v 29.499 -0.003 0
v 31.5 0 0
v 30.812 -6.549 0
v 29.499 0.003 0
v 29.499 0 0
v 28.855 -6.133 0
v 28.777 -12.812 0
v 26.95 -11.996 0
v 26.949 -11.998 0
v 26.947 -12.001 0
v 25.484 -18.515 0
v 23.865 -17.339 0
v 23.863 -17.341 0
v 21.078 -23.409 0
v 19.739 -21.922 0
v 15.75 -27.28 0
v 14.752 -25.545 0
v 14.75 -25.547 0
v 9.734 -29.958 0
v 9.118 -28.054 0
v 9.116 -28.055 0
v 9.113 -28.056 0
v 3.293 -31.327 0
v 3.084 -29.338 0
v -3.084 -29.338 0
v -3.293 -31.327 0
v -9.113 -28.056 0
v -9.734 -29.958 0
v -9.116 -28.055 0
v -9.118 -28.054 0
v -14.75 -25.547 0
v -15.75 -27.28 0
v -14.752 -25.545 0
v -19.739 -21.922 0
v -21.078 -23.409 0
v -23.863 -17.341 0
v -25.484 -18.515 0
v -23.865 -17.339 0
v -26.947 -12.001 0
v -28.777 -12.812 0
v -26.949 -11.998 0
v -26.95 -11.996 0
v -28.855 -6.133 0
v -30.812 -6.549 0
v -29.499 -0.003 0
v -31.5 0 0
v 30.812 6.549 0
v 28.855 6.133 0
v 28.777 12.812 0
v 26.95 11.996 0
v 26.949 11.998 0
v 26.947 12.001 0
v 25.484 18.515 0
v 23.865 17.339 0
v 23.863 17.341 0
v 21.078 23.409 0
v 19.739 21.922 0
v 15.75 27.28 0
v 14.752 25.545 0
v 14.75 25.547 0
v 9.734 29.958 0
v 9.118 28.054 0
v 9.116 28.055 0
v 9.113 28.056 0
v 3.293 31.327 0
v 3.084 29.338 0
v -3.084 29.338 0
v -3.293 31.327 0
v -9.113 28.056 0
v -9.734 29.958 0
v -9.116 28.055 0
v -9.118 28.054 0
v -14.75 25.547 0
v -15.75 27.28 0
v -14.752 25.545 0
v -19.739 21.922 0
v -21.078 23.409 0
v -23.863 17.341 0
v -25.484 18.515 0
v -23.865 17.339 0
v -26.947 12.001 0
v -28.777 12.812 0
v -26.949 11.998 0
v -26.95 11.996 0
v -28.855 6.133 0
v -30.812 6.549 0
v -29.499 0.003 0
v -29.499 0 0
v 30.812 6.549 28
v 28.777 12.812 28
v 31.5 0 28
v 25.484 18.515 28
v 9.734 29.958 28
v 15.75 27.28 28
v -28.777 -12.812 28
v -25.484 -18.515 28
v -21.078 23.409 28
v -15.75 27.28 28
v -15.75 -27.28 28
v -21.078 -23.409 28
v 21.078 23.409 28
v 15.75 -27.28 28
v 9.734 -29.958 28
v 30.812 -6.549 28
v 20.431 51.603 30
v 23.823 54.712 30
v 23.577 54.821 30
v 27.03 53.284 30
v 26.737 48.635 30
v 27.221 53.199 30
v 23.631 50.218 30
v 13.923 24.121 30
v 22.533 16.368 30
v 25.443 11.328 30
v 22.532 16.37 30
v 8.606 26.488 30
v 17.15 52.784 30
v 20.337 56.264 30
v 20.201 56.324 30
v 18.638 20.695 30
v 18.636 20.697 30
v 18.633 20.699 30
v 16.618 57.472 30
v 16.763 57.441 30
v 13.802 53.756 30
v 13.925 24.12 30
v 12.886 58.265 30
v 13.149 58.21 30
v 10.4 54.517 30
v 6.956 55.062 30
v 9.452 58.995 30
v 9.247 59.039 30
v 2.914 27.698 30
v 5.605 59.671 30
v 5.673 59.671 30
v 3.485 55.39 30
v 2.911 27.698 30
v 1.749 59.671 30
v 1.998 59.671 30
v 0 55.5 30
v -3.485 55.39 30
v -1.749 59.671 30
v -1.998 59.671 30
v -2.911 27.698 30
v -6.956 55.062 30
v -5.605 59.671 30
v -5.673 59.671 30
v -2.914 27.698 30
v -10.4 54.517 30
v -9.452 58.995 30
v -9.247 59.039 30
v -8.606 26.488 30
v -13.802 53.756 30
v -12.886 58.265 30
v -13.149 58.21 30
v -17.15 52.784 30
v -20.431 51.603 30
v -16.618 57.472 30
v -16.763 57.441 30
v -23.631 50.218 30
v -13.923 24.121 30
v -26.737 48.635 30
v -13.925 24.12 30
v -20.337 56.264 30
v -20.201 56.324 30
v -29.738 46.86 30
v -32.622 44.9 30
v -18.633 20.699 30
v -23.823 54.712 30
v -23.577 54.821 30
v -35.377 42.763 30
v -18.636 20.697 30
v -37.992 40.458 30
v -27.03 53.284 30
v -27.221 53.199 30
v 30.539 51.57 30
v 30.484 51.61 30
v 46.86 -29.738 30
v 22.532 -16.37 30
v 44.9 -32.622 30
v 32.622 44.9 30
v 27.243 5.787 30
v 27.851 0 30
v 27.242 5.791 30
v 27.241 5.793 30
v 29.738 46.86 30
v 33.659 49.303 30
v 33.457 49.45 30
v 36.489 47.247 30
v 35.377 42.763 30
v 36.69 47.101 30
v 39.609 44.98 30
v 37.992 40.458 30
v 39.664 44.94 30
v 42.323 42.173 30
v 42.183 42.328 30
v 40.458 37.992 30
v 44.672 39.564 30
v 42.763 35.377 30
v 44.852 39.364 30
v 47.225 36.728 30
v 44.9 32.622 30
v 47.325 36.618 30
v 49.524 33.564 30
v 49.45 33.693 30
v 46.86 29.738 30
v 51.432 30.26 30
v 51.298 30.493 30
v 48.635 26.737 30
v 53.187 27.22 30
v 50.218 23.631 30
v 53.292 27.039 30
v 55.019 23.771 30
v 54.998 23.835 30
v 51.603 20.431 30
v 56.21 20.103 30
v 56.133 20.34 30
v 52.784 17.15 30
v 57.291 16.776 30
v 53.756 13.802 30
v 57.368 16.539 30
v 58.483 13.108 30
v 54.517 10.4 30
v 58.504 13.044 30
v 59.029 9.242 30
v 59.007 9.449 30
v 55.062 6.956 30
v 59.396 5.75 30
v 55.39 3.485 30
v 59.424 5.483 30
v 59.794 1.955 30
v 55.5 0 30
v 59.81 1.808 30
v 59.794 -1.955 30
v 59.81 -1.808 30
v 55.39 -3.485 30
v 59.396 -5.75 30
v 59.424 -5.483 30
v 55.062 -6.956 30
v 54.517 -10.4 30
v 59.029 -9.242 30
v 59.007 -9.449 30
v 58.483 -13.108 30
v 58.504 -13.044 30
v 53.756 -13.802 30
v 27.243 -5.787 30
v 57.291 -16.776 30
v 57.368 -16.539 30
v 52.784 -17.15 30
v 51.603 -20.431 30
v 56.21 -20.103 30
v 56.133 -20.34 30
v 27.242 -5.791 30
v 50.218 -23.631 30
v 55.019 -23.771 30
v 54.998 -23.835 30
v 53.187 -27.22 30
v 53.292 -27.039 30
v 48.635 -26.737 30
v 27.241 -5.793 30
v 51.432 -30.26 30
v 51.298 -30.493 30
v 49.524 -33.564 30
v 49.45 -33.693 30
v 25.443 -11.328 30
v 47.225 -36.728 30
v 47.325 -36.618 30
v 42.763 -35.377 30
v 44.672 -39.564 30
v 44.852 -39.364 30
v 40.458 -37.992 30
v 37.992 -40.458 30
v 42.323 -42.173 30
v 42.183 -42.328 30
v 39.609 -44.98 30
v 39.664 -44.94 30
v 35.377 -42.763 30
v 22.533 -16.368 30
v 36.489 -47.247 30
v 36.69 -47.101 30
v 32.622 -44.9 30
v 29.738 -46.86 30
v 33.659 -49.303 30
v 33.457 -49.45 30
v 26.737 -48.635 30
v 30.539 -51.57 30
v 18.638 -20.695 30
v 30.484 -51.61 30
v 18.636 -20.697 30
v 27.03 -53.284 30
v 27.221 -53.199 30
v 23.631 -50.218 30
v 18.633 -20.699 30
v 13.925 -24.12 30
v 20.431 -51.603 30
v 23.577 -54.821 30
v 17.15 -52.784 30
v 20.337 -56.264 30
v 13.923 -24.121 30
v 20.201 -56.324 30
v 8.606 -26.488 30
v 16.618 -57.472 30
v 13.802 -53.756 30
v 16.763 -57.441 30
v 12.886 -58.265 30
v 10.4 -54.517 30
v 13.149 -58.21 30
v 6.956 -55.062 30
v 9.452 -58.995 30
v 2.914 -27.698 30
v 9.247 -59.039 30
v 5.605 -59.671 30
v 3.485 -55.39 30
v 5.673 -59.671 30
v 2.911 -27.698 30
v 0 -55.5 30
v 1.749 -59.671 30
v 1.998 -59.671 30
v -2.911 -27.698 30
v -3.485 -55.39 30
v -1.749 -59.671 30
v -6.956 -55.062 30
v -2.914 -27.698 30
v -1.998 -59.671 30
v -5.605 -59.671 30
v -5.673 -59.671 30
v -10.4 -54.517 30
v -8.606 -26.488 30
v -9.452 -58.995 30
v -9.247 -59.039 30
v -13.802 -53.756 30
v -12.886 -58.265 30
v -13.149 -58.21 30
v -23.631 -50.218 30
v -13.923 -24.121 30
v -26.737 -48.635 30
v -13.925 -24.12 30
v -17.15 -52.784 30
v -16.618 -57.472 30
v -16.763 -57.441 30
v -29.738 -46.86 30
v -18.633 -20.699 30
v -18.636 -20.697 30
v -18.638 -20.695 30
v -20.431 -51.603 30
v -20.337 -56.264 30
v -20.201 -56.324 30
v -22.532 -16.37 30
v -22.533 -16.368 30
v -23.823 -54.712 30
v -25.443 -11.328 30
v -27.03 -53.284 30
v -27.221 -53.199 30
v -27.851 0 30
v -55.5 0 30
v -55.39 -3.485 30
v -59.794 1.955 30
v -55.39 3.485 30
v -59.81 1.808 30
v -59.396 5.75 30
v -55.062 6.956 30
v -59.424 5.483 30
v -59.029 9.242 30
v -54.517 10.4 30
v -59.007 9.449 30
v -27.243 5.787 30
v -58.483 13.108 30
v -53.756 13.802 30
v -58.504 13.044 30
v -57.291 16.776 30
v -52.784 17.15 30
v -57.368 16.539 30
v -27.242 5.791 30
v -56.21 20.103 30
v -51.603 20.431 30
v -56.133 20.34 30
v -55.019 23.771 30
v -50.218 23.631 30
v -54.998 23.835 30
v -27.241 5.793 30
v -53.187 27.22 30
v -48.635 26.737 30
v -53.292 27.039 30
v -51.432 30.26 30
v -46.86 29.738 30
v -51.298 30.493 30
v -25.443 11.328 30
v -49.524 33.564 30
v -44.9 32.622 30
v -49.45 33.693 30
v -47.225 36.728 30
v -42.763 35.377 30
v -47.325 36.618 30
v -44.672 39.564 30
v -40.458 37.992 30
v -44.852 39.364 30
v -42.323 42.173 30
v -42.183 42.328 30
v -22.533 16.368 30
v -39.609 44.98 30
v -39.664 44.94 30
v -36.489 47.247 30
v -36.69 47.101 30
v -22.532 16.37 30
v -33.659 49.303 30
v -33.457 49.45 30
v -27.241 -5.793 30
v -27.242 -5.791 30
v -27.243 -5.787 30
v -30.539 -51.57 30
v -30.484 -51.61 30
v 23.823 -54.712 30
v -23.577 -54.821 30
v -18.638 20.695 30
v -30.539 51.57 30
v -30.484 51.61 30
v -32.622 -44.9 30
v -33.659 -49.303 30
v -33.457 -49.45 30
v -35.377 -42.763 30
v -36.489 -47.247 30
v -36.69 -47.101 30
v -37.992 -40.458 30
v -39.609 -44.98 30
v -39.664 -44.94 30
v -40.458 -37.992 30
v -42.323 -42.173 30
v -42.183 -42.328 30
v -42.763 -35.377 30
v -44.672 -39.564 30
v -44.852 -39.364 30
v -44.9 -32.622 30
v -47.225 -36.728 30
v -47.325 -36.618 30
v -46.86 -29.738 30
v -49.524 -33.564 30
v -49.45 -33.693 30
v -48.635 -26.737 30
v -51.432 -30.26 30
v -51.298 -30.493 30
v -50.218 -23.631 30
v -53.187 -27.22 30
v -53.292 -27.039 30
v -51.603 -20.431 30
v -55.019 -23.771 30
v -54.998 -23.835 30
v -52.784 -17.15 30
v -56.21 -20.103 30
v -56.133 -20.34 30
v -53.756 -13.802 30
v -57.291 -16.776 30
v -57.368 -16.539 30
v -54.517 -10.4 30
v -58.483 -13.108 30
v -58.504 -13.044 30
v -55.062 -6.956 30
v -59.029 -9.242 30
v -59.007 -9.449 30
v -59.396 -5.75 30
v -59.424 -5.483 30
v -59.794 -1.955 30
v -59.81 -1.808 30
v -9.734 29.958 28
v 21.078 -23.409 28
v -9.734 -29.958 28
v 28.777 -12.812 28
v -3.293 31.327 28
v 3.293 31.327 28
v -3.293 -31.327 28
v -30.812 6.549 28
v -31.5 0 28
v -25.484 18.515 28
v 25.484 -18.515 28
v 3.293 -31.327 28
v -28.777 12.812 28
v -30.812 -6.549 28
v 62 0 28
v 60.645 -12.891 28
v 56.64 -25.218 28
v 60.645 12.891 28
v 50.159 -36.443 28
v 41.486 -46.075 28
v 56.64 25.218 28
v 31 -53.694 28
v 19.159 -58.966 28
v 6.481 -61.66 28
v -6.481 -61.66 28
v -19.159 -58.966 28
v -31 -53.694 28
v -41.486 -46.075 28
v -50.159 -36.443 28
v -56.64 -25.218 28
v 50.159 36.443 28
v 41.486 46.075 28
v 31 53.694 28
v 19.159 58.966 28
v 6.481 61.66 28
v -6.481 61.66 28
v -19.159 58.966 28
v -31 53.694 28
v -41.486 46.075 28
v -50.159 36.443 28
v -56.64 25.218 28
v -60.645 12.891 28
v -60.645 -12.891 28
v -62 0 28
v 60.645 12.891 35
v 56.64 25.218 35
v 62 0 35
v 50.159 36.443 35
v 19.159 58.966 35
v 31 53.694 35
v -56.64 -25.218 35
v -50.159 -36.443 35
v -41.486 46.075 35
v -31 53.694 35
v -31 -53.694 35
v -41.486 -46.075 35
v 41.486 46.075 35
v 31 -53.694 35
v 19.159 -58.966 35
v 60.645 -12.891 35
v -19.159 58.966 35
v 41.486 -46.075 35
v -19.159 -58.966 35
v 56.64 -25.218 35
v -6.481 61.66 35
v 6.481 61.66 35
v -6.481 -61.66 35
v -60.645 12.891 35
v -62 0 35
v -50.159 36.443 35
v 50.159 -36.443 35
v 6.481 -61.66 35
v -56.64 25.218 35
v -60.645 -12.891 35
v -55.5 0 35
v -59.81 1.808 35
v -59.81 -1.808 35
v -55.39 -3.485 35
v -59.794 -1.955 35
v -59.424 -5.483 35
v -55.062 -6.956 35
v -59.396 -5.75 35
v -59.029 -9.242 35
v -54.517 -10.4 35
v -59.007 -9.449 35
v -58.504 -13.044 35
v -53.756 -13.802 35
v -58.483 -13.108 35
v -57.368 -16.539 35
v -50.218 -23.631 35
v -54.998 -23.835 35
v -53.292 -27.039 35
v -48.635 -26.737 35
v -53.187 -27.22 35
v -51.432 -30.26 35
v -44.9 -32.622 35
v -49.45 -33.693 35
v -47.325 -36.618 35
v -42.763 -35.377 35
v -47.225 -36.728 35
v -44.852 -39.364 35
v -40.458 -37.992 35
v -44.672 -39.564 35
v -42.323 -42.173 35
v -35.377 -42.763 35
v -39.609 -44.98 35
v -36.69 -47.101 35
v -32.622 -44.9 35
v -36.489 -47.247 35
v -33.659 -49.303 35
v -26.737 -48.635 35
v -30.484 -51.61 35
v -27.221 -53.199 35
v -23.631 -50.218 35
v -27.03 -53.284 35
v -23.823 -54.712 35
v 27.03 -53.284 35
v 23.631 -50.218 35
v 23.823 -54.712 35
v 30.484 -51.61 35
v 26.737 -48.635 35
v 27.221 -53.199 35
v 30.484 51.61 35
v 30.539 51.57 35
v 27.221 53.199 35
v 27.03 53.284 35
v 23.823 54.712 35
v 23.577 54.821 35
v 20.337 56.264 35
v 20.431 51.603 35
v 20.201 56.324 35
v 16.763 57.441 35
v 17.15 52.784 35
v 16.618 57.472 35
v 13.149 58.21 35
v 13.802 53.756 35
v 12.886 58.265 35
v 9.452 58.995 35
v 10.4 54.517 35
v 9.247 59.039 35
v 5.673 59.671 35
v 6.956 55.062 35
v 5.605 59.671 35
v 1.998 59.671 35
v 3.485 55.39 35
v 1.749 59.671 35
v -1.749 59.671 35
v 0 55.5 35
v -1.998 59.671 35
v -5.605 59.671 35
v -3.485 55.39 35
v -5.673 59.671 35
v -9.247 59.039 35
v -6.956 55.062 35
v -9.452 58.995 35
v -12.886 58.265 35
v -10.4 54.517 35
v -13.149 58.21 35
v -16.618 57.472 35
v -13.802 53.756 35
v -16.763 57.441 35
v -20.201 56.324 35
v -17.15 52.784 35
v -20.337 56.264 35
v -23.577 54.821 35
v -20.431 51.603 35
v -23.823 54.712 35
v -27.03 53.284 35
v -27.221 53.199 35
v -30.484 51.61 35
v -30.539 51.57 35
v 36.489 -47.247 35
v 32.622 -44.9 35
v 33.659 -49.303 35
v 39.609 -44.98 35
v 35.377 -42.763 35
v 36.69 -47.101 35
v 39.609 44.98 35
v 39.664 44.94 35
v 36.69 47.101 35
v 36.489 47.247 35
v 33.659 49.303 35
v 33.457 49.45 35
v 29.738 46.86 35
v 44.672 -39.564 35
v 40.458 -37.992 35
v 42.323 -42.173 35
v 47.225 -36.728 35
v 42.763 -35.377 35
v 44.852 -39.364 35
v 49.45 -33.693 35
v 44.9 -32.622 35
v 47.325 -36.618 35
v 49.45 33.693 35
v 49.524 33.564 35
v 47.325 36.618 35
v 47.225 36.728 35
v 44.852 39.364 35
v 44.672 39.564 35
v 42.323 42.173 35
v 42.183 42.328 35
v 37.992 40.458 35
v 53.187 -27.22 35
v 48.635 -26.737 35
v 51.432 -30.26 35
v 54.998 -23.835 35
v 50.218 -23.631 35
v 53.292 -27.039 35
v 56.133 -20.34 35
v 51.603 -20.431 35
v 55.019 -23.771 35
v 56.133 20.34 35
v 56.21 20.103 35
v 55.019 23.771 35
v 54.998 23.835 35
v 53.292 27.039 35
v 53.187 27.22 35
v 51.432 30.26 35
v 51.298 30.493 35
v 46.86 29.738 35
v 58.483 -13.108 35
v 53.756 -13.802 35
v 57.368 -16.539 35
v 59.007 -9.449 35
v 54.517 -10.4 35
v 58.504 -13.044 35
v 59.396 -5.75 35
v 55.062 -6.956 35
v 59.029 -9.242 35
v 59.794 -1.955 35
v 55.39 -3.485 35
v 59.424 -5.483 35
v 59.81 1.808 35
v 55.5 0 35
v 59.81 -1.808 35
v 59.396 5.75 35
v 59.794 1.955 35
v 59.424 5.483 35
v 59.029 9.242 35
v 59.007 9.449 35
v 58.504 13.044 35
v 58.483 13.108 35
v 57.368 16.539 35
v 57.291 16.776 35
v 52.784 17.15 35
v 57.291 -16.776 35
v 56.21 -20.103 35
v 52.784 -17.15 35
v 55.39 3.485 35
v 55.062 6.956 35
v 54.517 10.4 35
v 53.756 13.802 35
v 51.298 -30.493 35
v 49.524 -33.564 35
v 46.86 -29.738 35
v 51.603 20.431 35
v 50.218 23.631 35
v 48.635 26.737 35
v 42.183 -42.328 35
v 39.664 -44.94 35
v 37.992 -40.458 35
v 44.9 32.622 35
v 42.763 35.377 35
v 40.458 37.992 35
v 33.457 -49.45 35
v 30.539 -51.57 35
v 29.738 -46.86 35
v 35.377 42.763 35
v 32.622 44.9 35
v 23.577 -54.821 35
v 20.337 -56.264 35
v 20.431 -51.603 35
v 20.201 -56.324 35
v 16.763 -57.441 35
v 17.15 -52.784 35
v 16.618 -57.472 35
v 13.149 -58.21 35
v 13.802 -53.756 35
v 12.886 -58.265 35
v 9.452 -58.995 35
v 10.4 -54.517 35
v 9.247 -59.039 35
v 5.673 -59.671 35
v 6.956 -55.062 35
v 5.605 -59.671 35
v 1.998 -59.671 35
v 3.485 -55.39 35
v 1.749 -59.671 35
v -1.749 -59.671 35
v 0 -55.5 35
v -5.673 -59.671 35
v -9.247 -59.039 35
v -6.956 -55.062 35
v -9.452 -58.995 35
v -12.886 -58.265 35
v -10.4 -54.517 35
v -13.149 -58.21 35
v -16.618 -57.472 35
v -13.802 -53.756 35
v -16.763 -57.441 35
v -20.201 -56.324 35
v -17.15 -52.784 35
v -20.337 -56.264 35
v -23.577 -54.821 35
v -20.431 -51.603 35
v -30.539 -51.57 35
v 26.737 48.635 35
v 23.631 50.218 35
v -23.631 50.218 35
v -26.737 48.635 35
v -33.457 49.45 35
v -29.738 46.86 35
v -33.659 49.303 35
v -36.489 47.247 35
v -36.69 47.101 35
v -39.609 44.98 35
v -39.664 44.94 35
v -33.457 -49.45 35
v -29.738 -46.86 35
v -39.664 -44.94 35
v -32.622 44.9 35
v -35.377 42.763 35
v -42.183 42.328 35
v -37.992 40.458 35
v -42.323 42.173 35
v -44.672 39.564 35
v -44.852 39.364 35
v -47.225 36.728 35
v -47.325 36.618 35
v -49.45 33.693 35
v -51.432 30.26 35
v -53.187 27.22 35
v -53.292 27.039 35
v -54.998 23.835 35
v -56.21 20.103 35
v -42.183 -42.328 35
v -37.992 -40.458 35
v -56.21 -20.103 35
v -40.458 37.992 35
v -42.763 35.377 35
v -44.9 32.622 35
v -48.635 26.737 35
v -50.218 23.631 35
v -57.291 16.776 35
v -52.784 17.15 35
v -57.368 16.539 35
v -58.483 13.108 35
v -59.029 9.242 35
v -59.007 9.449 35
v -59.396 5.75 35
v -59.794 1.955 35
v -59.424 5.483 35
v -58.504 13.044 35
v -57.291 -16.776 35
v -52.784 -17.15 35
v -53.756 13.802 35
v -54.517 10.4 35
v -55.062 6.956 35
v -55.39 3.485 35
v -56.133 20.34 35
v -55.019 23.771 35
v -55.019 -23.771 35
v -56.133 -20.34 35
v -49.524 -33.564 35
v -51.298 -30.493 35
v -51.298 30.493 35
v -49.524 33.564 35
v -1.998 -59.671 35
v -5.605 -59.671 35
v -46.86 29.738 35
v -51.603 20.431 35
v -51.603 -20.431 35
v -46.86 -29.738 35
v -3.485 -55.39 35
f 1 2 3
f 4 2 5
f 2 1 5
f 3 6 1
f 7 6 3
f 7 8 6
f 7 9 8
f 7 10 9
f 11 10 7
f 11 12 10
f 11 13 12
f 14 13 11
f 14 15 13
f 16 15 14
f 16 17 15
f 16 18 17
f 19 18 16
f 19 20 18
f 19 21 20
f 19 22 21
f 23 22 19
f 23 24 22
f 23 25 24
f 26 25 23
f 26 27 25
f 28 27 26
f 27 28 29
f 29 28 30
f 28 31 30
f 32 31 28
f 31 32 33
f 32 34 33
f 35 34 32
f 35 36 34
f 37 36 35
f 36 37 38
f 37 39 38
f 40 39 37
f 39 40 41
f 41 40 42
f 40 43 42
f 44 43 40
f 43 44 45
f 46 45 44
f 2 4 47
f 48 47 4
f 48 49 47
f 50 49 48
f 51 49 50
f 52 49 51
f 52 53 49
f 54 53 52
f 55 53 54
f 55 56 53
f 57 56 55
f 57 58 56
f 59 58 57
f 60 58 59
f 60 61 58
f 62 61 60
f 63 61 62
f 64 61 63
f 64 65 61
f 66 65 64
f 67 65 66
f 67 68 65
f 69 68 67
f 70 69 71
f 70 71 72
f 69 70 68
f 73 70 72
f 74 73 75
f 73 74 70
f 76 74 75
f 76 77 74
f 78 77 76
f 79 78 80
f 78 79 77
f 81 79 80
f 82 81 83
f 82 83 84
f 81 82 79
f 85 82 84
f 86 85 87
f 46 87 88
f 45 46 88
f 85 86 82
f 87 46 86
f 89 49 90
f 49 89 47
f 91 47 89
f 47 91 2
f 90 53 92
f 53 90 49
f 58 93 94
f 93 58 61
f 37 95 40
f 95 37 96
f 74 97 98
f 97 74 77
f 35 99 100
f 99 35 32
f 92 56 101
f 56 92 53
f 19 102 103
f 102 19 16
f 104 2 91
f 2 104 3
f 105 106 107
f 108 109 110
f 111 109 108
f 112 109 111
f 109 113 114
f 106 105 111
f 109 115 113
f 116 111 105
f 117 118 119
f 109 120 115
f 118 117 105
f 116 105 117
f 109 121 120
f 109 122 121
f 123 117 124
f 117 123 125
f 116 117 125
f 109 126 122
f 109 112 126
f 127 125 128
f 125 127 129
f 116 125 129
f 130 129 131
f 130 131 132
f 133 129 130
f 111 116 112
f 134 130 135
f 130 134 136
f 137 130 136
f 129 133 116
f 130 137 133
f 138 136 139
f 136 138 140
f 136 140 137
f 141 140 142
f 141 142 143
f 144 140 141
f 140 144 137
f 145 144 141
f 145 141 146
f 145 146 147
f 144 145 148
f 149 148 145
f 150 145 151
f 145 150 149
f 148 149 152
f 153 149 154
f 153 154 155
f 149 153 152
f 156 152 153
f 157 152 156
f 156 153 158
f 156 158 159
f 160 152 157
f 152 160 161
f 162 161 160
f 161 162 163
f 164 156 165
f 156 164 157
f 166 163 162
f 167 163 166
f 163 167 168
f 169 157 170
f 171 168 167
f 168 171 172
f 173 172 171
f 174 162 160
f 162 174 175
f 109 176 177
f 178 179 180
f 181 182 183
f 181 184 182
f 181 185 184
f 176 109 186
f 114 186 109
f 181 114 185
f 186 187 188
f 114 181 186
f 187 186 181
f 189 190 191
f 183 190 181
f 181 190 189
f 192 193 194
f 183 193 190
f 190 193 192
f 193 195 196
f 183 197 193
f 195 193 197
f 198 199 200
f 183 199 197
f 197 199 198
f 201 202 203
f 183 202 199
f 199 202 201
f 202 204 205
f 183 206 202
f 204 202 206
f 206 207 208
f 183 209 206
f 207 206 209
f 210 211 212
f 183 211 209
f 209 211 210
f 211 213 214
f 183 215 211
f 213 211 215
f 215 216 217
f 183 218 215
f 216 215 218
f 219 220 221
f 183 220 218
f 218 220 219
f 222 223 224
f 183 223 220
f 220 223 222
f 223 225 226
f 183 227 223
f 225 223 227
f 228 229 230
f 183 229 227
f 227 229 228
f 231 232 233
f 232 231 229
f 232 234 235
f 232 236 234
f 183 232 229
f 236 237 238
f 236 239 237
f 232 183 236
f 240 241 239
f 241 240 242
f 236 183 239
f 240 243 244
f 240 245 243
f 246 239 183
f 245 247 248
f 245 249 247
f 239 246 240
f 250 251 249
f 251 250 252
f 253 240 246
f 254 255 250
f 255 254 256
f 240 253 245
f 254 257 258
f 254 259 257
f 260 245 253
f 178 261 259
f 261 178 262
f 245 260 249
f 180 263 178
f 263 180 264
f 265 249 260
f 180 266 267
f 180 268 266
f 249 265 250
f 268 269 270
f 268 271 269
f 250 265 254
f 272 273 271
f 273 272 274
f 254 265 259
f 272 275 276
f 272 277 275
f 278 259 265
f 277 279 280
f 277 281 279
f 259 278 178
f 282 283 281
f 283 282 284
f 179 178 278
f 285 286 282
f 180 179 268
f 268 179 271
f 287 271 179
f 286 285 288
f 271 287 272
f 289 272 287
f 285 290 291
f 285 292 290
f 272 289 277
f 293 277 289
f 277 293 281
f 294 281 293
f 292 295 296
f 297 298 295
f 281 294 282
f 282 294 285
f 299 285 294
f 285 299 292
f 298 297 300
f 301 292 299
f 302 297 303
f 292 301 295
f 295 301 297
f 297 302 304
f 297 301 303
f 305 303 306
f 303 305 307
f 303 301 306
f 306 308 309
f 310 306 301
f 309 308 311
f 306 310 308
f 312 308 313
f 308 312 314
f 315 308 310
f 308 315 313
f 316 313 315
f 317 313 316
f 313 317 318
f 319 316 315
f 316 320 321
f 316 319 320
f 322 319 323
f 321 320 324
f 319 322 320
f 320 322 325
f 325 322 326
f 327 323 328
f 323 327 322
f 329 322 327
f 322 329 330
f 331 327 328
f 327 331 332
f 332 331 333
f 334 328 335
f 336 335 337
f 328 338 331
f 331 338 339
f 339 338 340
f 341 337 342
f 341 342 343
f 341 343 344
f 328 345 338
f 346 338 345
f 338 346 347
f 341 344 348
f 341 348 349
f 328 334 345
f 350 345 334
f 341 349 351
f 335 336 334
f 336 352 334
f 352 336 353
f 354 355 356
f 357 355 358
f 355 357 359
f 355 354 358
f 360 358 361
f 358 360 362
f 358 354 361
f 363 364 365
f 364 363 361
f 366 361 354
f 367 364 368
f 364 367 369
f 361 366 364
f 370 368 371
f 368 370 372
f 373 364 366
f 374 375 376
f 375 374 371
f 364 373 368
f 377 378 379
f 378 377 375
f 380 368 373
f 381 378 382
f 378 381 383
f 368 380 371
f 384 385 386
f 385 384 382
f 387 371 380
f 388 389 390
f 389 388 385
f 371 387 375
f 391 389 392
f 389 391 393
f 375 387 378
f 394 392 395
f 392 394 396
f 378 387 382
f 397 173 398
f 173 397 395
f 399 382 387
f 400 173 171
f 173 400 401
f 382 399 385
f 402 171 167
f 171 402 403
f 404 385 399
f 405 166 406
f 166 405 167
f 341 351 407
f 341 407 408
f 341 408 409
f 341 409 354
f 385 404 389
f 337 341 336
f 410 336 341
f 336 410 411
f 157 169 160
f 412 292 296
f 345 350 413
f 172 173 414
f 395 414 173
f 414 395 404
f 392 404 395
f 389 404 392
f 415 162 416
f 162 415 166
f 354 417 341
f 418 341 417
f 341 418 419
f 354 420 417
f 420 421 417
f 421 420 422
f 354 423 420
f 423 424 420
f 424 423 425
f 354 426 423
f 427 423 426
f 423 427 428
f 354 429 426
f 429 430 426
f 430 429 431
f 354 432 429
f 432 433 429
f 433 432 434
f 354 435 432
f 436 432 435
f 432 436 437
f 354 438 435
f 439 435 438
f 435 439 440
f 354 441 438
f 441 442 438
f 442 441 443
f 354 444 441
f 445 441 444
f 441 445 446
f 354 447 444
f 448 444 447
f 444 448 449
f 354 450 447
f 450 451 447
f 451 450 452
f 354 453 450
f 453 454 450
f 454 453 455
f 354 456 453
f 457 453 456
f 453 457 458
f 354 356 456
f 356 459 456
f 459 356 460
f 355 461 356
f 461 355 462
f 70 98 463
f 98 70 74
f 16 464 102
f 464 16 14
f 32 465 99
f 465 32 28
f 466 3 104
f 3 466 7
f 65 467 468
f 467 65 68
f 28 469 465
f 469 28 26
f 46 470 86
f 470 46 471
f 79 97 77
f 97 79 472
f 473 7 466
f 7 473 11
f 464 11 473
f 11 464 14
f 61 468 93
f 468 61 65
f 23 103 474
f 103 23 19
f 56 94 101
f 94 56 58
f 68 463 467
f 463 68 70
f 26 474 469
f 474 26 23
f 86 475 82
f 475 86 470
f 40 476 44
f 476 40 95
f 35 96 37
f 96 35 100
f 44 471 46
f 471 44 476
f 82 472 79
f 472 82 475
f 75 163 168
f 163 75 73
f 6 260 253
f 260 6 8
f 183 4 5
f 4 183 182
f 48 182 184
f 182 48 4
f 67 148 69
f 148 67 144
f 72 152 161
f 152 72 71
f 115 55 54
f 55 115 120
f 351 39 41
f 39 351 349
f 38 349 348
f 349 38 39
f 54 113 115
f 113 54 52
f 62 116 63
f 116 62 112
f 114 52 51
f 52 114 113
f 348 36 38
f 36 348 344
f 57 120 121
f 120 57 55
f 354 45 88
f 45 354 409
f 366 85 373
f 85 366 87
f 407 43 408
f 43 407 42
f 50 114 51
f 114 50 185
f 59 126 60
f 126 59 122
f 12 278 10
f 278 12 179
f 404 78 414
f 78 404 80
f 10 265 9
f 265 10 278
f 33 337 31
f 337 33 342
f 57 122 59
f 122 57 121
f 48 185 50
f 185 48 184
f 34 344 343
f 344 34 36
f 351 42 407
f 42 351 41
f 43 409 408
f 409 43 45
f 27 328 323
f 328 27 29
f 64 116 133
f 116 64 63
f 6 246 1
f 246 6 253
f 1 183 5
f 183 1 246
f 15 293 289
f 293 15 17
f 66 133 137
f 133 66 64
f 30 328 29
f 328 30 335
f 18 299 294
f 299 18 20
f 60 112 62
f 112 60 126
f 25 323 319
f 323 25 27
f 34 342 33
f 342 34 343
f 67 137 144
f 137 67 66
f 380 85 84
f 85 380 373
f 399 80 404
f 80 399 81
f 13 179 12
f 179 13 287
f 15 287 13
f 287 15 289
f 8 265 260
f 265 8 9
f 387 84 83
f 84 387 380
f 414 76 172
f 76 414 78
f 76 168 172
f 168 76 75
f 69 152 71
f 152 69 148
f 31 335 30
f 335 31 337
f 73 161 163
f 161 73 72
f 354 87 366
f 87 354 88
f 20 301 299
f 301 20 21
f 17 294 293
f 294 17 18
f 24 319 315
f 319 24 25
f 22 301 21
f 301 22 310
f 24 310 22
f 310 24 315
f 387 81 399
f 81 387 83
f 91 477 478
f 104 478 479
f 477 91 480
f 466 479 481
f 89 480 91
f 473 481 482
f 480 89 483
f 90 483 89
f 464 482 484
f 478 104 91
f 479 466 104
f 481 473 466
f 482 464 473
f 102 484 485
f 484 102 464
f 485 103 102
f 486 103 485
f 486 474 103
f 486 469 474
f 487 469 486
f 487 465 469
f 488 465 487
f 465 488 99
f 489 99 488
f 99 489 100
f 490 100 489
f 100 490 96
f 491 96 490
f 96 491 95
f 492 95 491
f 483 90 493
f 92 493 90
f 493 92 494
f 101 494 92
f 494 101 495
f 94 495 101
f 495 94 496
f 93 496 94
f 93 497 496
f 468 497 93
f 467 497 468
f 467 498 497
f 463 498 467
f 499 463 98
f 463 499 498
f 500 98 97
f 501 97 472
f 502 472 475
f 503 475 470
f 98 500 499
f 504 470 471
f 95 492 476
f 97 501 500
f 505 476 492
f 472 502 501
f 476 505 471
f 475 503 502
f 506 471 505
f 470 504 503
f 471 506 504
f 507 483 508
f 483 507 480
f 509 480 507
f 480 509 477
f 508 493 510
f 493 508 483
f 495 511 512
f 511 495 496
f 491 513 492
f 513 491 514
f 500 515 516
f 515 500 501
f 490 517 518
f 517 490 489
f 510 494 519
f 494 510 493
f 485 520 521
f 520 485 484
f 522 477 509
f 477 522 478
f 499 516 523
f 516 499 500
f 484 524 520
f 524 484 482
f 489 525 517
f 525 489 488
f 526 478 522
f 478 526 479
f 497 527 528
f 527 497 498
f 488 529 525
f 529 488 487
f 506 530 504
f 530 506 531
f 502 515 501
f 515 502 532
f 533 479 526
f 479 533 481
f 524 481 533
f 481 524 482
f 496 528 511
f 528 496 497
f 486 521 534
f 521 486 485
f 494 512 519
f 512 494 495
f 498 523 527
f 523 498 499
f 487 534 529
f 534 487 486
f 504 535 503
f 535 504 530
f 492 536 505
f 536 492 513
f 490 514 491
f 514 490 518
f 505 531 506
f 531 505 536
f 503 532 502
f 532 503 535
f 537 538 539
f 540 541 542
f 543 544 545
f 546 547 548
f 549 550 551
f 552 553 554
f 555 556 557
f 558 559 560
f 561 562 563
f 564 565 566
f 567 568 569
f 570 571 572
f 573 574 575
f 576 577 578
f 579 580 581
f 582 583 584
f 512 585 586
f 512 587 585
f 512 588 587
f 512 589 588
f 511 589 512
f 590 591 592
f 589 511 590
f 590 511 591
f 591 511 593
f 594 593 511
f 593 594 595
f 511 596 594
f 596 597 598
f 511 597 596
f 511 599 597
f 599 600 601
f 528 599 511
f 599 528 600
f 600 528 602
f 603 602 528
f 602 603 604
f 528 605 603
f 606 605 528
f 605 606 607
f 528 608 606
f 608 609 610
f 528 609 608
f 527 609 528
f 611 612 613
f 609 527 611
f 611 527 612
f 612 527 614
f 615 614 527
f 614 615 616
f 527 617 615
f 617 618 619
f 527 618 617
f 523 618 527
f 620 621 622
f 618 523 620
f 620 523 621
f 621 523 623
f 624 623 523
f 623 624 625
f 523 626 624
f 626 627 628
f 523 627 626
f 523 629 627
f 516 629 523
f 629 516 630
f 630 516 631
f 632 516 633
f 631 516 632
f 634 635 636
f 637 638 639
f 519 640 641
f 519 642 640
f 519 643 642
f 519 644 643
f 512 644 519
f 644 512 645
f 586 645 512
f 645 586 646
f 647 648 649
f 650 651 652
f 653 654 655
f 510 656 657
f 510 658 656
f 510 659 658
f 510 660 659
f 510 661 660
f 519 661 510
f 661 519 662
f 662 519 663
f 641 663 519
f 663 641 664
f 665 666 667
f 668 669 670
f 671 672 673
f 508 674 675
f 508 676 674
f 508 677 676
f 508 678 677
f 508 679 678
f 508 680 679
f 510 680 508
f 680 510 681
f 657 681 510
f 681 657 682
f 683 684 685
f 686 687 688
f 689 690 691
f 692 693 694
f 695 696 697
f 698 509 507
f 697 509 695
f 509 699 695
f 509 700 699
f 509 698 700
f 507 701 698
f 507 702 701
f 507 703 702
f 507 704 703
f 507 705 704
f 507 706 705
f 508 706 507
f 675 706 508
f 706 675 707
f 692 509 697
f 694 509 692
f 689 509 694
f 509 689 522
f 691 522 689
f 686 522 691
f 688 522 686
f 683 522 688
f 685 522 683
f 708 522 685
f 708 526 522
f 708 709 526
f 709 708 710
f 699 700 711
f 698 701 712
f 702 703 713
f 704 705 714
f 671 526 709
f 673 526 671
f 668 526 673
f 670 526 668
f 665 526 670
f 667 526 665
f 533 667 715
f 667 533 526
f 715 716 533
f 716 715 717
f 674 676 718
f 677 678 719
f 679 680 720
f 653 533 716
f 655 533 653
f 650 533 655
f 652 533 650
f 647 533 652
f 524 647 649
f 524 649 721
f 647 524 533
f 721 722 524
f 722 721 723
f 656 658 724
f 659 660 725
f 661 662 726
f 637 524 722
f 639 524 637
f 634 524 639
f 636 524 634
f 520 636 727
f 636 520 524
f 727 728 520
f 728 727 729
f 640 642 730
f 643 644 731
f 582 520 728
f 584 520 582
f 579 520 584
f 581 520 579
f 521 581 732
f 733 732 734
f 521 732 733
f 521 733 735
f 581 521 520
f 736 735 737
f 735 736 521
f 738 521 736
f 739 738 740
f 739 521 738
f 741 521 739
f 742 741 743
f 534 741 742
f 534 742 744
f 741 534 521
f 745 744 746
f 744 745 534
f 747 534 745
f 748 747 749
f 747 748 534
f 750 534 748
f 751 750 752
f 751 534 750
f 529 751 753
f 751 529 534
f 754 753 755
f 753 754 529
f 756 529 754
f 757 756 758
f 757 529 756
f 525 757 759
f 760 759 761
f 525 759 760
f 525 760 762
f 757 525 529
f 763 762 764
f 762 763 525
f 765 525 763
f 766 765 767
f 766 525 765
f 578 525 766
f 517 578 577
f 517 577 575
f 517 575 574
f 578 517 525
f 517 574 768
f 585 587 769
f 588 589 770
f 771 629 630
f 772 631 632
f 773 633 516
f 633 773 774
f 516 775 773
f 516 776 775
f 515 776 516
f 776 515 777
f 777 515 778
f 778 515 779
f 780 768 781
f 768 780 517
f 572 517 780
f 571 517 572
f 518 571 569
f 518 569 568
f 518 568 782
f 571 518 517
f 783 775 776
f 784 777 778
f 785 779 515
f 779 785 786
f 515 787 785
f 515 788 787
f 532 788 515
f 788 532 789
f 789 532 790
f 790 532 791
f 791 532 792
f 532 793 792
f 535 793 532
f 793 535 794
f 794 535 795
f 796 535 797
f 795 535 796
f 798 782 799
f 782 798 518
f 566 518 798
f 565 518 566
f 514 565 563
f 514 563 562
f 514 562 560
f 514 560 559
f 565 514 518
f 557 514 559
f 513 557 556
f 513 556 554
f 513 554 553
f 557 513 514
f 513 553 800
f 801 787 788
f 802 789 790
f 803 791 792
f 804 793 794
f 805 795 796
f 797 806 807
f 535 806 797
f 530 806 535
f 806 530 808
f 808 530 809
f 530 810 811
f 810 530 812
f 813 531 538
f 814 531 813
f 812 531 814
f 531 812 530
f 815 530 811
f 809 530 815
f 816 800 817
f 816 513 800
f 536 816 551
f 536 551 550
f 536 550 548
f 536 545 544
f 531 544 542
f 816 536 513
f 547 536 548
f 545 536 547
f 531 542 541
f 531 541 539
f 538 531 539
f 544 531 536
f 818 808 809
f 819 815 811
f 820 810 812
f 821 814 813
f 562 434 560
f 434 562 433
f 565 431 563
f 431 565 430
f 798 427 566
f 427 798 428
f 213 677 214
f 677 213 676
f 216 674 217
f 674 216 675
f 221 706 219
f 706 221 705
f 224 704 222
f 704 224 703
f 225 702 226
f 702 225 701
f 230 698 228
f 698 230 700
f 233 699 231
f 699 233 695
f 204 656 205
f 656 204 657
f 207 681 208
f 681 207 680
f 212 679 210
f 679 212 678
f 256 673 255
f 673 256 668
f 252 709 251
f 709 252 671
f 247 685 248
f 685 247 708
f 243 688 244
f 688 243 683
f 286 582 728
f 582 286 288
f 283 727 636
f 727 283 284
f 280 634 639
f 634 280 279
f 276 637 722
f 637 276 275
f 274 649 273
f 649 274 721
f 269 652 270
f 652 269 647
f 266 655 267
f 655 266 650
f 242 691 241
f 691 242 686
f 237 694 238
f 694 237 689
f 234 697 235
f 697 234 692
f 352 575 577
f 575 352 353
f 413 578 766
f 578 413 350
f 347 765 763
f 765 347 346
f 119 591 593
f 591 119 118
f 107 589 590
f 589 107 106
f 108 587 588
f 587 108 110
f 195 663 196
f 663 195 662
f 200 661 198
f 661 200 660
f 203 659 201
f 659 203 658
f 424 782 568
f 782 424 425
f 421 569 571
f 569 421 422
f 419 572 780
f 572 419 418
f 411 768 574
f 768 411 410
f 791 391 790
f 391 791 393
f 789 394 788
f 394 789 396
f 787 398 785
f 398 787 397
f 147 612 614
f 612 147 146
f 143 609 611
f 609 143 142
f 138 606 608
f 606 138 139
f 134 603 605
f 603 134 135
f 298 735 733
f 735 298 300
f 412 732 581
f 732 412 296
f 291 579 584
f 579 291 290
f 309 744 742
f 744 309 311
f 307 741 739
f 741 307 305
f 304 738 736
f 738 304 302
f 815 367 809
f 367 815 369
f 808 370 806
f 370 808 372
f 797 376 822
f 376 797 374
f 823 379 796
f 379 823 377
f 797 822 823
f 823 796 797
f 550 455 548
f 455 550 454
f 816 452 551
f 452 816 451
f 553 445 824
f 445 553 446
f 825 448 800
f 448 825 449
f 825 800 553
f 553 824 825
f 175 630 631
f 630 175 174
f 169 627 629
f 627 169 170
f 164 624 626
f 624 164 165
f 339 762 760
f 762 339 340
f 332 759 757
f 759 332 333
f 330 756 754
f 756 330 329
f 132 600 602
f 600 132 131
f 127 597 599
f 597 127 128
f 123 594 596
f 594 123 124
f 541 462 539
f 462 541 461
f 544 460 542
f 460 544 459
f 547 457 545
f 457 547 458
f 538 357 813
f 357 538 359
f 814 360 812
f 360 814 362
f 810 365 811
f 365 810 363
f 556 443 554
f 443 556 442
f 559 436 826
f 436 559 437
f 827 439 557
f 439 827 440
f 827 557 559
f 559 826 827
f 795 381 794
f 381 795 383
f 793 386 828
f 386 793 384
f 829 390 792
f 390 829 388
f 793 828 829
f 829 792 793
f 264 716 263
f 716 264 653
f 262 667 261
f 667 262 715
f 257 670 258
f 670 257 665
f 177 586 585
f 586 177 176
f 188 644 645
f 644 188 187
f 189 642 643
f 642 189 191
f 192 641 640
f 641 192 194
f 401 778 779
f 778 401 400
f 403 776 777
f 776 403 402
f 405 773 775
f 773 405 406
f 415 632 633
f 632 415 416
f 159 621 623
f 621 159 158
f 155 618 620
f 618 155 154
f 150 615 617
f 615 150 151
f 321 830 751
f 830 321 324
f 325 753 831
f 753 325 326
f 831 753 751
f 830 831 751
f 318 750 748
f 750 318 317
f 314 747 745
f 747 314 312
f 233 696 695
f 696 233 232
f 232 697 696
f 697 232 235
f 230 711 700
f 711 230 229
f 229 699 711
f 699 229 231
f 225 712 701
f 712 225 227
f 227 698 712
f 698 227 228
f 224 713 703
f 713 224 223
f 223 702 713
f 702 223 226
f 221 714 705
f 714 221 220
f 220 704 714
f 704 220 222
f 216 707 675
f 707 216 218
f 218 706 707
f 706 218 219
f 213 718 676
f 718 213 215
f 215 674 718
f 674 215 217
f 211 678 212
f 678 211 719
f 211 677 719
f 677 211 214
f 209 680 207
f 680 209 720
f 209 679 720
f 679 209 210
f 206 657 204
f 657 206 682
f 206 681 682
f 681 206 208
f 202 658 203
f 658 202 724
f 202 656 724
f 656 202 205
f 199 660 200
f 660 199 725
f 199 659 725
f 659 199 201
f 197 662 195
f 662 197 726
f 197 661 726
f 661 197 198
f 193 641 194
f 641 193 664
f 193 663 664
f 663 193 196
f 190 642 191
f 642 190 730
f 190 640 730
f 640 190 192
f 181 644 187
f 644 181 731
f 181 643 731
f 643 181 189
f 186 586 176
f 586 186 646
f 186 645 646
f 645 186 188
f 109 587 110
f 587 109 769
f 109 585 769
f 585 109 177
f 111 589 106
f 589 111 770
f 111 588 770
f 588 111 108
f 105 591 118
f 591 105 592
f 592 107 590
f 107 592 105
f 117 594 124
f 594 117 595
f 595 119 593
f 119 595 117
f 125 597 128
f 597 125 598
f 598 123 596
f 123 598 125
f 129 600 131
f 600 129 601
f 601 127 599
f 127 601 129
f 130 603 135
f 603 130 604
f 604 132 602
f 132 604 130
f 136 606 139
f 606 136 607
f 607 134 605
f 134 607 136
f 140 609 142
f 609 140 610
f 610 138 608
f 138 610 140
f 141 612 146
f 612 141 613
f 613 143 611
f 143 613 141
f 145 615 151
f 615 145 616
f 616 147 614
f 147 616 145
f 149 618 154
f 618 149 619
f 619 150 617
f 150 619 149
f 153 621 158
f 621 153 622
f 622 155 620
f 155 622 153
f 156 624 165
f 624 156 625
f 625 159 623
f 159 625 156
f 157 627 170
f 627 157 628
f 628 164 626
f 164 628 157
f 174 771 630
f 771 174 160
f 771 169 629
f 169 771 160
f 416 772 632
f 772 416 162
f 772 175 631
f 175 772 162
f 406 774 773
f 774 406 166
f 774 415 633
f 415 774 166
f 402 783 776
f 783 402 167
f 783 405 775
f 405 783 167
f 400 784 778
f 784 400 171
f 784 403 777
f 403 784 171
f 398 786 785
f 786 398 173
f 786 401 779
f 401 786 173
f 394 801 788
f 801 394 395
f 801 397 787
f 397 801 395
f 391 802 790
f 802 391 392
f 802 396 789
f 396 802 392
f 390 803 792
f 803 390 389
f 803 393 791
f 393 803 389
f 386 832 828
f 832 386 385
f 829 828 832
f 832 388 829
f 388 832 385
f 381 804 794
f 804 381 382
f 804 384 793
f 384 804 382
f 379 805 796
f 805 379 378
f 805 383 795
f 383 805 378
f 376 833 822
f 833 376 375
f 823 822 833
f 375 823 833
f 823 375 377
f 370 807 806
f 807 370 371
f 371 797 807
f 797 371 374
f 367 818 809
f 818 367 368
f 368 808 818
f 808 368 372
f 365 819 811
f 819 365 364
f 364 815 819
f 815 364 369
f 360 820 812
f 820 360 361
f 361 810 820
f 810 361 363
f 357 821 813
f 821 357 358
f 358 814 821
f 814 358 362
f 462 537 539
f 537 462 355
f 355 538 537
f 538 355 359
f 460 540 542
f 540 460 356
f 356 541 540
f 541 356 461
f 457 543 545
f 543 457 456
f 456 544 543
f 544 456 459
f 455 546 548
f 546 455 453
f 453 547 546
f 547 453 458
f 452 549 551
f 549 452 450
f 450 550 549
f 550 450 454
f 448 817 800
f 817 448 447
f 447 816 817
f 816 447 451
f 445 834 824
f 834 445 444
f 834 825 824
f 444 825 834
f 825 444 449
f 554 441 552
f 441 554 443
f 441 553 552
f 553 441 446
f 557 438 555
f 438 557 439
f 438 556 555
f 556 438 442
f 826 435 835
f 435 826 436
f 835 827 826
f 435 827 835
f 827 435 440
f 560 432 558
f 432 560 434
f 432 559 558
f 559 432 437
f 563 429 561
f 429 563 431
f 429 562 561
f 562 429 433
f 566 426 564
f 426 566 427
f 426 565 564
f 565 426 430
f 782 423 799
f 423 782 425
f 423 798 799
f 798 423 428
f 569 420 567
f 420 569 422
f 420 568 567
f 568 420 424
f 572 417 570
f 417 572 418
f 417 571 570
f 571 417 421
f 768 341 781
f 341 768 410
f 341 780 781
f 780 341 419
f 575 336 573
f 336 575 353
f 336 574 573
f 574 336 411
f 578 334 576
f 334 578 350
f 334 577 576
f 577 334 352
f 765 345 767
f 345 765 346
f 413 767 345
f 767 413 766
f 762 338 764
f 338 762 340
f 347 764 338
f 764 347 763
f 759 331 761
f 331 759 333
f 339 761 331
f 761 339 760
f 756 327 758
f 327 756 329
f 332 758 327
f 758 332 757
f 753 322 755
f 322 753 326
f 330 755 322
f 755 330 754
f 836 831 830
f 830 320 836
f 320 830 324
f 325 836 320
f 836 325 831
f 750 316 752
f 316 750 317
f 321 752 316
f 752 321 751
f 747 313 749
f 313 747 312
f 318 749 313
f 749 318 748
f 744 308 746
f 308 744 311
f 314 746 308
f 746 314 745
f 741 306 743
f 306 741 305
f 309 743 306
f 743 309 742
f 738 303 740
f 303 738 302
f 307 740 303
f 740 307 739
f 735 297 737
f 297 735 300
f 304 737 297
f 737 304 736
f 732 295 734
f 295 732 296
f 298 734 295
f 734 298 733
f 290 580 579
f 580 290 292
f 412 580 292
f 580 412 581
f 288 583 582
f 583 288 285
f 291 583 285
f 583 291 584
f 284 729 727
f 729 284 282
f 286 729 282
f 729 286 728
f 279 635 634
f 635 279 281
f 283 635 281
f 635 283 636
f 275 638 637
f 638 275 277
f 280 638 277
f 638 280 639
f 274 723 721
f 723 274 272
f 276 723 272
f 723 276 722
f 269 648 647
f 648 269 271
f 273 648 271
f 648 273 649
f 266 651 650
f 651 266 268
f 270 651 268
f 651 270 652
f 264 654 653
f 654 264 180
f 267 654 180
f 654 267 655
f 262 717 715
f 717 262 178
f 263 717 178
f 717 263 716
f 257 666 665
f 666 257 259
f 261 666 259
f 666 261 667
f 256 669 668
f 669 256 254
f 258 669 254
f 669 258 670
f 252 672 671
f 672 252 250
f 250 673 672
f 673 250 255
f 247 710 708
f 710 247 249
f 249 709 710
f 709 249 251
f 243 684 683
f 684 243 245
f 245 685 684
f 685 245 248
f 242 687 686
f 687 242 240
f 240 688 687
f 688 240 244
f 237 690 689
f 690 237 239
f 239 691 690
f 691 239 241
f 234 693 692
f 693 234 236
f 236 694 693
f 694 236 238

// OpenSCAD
innerRadiusA = 29.5;
innerRadiusB = 27.85;
outerRadius = innerRadiusA + 2;
wrapperHeight = 30;

gearHeight = 5;
innerRadiusGear = 60;
outerRadiusGear = 62;
teethCount = 100;

teethSize = 2 * PI * innerRadiusGear / teethCount / 1.73; // 1.73 = tan(60)
teethDepth = 3;

connectingSegmentHeight = 2;


translate([0, 0, wrapperHeight / 2])
    difference() {
       cylinder(wrapperHeight, outerRadius, outerRadius, center=true);
       cylinder(wrapperHeight * 1.001, innerRadiusA, innerRadiusB, center=true);
    }
translate([0, 0, wrapperHeight - connectingSegmentHeight / 2])
    difference() {
       cylinder(connectingSegmentHeight, outerRadiusGear, outerRadiusGear, center=true);
       cylinder(connectingSegmentHeight * 1.001, innerRadiusA, innerRadiusB, center=true);
    }

    

translate([0, 0, gearHeight / 2])
    union() {
        translate([0, 0, wrapperHeight])
            difference() {
                cylinder(gearHeight, outerRadiusGear, outerRadiusGear, center=true);
                cylinder(gearHeight * 1.001, innerRadiusGear, innerRadiusGear, center=true);
            }

        for (i = [0:1:teethCount])
        {
            angle = 360 * i / teethCount;
            rotate(angle)
                translate([innerRadiusGear - teethDepth / 2, 0, wrapperHeight])
                    teeth(angle, true);
            
        }
    }



  
module teeth(angle, insideGear) {
    //rotate(25)
      //  cube([teethSize, teethSize, gearHeight], center=true);
    linear_extrude(height = gearHeight, center = true)
        scale([teethDepth / teethSize, 1, 1])
            rotate(insideGear ? 180 : 0)
                circle(teethSize,$fn=3);
}

/*

smallGearRadius = 10 - teethDepth * .9;
smallGearCircumference = smallGearRadius * 2 * PI;
smallGearTeethCount = floor(smallGearCircumference / teethSize / 1.8);

translate([48, 0, 2.5])
rotate(10)
    union() {
        translate([0, 0, wrapperHeight])
            cylinder(gearHeight, smallGearRadius, smallGearRadius, center=true);
         

        for (i = [0:1:teethCount])
        {
            angle = 360 * i / smallGearTeethCount;
            rotate(angle)
                translate([smallGearRadius + teethDepth / 2 - teethDepth * .1, 0, wrapperHeight])
                    teeth(angle, false);
            
        }
    }*/
